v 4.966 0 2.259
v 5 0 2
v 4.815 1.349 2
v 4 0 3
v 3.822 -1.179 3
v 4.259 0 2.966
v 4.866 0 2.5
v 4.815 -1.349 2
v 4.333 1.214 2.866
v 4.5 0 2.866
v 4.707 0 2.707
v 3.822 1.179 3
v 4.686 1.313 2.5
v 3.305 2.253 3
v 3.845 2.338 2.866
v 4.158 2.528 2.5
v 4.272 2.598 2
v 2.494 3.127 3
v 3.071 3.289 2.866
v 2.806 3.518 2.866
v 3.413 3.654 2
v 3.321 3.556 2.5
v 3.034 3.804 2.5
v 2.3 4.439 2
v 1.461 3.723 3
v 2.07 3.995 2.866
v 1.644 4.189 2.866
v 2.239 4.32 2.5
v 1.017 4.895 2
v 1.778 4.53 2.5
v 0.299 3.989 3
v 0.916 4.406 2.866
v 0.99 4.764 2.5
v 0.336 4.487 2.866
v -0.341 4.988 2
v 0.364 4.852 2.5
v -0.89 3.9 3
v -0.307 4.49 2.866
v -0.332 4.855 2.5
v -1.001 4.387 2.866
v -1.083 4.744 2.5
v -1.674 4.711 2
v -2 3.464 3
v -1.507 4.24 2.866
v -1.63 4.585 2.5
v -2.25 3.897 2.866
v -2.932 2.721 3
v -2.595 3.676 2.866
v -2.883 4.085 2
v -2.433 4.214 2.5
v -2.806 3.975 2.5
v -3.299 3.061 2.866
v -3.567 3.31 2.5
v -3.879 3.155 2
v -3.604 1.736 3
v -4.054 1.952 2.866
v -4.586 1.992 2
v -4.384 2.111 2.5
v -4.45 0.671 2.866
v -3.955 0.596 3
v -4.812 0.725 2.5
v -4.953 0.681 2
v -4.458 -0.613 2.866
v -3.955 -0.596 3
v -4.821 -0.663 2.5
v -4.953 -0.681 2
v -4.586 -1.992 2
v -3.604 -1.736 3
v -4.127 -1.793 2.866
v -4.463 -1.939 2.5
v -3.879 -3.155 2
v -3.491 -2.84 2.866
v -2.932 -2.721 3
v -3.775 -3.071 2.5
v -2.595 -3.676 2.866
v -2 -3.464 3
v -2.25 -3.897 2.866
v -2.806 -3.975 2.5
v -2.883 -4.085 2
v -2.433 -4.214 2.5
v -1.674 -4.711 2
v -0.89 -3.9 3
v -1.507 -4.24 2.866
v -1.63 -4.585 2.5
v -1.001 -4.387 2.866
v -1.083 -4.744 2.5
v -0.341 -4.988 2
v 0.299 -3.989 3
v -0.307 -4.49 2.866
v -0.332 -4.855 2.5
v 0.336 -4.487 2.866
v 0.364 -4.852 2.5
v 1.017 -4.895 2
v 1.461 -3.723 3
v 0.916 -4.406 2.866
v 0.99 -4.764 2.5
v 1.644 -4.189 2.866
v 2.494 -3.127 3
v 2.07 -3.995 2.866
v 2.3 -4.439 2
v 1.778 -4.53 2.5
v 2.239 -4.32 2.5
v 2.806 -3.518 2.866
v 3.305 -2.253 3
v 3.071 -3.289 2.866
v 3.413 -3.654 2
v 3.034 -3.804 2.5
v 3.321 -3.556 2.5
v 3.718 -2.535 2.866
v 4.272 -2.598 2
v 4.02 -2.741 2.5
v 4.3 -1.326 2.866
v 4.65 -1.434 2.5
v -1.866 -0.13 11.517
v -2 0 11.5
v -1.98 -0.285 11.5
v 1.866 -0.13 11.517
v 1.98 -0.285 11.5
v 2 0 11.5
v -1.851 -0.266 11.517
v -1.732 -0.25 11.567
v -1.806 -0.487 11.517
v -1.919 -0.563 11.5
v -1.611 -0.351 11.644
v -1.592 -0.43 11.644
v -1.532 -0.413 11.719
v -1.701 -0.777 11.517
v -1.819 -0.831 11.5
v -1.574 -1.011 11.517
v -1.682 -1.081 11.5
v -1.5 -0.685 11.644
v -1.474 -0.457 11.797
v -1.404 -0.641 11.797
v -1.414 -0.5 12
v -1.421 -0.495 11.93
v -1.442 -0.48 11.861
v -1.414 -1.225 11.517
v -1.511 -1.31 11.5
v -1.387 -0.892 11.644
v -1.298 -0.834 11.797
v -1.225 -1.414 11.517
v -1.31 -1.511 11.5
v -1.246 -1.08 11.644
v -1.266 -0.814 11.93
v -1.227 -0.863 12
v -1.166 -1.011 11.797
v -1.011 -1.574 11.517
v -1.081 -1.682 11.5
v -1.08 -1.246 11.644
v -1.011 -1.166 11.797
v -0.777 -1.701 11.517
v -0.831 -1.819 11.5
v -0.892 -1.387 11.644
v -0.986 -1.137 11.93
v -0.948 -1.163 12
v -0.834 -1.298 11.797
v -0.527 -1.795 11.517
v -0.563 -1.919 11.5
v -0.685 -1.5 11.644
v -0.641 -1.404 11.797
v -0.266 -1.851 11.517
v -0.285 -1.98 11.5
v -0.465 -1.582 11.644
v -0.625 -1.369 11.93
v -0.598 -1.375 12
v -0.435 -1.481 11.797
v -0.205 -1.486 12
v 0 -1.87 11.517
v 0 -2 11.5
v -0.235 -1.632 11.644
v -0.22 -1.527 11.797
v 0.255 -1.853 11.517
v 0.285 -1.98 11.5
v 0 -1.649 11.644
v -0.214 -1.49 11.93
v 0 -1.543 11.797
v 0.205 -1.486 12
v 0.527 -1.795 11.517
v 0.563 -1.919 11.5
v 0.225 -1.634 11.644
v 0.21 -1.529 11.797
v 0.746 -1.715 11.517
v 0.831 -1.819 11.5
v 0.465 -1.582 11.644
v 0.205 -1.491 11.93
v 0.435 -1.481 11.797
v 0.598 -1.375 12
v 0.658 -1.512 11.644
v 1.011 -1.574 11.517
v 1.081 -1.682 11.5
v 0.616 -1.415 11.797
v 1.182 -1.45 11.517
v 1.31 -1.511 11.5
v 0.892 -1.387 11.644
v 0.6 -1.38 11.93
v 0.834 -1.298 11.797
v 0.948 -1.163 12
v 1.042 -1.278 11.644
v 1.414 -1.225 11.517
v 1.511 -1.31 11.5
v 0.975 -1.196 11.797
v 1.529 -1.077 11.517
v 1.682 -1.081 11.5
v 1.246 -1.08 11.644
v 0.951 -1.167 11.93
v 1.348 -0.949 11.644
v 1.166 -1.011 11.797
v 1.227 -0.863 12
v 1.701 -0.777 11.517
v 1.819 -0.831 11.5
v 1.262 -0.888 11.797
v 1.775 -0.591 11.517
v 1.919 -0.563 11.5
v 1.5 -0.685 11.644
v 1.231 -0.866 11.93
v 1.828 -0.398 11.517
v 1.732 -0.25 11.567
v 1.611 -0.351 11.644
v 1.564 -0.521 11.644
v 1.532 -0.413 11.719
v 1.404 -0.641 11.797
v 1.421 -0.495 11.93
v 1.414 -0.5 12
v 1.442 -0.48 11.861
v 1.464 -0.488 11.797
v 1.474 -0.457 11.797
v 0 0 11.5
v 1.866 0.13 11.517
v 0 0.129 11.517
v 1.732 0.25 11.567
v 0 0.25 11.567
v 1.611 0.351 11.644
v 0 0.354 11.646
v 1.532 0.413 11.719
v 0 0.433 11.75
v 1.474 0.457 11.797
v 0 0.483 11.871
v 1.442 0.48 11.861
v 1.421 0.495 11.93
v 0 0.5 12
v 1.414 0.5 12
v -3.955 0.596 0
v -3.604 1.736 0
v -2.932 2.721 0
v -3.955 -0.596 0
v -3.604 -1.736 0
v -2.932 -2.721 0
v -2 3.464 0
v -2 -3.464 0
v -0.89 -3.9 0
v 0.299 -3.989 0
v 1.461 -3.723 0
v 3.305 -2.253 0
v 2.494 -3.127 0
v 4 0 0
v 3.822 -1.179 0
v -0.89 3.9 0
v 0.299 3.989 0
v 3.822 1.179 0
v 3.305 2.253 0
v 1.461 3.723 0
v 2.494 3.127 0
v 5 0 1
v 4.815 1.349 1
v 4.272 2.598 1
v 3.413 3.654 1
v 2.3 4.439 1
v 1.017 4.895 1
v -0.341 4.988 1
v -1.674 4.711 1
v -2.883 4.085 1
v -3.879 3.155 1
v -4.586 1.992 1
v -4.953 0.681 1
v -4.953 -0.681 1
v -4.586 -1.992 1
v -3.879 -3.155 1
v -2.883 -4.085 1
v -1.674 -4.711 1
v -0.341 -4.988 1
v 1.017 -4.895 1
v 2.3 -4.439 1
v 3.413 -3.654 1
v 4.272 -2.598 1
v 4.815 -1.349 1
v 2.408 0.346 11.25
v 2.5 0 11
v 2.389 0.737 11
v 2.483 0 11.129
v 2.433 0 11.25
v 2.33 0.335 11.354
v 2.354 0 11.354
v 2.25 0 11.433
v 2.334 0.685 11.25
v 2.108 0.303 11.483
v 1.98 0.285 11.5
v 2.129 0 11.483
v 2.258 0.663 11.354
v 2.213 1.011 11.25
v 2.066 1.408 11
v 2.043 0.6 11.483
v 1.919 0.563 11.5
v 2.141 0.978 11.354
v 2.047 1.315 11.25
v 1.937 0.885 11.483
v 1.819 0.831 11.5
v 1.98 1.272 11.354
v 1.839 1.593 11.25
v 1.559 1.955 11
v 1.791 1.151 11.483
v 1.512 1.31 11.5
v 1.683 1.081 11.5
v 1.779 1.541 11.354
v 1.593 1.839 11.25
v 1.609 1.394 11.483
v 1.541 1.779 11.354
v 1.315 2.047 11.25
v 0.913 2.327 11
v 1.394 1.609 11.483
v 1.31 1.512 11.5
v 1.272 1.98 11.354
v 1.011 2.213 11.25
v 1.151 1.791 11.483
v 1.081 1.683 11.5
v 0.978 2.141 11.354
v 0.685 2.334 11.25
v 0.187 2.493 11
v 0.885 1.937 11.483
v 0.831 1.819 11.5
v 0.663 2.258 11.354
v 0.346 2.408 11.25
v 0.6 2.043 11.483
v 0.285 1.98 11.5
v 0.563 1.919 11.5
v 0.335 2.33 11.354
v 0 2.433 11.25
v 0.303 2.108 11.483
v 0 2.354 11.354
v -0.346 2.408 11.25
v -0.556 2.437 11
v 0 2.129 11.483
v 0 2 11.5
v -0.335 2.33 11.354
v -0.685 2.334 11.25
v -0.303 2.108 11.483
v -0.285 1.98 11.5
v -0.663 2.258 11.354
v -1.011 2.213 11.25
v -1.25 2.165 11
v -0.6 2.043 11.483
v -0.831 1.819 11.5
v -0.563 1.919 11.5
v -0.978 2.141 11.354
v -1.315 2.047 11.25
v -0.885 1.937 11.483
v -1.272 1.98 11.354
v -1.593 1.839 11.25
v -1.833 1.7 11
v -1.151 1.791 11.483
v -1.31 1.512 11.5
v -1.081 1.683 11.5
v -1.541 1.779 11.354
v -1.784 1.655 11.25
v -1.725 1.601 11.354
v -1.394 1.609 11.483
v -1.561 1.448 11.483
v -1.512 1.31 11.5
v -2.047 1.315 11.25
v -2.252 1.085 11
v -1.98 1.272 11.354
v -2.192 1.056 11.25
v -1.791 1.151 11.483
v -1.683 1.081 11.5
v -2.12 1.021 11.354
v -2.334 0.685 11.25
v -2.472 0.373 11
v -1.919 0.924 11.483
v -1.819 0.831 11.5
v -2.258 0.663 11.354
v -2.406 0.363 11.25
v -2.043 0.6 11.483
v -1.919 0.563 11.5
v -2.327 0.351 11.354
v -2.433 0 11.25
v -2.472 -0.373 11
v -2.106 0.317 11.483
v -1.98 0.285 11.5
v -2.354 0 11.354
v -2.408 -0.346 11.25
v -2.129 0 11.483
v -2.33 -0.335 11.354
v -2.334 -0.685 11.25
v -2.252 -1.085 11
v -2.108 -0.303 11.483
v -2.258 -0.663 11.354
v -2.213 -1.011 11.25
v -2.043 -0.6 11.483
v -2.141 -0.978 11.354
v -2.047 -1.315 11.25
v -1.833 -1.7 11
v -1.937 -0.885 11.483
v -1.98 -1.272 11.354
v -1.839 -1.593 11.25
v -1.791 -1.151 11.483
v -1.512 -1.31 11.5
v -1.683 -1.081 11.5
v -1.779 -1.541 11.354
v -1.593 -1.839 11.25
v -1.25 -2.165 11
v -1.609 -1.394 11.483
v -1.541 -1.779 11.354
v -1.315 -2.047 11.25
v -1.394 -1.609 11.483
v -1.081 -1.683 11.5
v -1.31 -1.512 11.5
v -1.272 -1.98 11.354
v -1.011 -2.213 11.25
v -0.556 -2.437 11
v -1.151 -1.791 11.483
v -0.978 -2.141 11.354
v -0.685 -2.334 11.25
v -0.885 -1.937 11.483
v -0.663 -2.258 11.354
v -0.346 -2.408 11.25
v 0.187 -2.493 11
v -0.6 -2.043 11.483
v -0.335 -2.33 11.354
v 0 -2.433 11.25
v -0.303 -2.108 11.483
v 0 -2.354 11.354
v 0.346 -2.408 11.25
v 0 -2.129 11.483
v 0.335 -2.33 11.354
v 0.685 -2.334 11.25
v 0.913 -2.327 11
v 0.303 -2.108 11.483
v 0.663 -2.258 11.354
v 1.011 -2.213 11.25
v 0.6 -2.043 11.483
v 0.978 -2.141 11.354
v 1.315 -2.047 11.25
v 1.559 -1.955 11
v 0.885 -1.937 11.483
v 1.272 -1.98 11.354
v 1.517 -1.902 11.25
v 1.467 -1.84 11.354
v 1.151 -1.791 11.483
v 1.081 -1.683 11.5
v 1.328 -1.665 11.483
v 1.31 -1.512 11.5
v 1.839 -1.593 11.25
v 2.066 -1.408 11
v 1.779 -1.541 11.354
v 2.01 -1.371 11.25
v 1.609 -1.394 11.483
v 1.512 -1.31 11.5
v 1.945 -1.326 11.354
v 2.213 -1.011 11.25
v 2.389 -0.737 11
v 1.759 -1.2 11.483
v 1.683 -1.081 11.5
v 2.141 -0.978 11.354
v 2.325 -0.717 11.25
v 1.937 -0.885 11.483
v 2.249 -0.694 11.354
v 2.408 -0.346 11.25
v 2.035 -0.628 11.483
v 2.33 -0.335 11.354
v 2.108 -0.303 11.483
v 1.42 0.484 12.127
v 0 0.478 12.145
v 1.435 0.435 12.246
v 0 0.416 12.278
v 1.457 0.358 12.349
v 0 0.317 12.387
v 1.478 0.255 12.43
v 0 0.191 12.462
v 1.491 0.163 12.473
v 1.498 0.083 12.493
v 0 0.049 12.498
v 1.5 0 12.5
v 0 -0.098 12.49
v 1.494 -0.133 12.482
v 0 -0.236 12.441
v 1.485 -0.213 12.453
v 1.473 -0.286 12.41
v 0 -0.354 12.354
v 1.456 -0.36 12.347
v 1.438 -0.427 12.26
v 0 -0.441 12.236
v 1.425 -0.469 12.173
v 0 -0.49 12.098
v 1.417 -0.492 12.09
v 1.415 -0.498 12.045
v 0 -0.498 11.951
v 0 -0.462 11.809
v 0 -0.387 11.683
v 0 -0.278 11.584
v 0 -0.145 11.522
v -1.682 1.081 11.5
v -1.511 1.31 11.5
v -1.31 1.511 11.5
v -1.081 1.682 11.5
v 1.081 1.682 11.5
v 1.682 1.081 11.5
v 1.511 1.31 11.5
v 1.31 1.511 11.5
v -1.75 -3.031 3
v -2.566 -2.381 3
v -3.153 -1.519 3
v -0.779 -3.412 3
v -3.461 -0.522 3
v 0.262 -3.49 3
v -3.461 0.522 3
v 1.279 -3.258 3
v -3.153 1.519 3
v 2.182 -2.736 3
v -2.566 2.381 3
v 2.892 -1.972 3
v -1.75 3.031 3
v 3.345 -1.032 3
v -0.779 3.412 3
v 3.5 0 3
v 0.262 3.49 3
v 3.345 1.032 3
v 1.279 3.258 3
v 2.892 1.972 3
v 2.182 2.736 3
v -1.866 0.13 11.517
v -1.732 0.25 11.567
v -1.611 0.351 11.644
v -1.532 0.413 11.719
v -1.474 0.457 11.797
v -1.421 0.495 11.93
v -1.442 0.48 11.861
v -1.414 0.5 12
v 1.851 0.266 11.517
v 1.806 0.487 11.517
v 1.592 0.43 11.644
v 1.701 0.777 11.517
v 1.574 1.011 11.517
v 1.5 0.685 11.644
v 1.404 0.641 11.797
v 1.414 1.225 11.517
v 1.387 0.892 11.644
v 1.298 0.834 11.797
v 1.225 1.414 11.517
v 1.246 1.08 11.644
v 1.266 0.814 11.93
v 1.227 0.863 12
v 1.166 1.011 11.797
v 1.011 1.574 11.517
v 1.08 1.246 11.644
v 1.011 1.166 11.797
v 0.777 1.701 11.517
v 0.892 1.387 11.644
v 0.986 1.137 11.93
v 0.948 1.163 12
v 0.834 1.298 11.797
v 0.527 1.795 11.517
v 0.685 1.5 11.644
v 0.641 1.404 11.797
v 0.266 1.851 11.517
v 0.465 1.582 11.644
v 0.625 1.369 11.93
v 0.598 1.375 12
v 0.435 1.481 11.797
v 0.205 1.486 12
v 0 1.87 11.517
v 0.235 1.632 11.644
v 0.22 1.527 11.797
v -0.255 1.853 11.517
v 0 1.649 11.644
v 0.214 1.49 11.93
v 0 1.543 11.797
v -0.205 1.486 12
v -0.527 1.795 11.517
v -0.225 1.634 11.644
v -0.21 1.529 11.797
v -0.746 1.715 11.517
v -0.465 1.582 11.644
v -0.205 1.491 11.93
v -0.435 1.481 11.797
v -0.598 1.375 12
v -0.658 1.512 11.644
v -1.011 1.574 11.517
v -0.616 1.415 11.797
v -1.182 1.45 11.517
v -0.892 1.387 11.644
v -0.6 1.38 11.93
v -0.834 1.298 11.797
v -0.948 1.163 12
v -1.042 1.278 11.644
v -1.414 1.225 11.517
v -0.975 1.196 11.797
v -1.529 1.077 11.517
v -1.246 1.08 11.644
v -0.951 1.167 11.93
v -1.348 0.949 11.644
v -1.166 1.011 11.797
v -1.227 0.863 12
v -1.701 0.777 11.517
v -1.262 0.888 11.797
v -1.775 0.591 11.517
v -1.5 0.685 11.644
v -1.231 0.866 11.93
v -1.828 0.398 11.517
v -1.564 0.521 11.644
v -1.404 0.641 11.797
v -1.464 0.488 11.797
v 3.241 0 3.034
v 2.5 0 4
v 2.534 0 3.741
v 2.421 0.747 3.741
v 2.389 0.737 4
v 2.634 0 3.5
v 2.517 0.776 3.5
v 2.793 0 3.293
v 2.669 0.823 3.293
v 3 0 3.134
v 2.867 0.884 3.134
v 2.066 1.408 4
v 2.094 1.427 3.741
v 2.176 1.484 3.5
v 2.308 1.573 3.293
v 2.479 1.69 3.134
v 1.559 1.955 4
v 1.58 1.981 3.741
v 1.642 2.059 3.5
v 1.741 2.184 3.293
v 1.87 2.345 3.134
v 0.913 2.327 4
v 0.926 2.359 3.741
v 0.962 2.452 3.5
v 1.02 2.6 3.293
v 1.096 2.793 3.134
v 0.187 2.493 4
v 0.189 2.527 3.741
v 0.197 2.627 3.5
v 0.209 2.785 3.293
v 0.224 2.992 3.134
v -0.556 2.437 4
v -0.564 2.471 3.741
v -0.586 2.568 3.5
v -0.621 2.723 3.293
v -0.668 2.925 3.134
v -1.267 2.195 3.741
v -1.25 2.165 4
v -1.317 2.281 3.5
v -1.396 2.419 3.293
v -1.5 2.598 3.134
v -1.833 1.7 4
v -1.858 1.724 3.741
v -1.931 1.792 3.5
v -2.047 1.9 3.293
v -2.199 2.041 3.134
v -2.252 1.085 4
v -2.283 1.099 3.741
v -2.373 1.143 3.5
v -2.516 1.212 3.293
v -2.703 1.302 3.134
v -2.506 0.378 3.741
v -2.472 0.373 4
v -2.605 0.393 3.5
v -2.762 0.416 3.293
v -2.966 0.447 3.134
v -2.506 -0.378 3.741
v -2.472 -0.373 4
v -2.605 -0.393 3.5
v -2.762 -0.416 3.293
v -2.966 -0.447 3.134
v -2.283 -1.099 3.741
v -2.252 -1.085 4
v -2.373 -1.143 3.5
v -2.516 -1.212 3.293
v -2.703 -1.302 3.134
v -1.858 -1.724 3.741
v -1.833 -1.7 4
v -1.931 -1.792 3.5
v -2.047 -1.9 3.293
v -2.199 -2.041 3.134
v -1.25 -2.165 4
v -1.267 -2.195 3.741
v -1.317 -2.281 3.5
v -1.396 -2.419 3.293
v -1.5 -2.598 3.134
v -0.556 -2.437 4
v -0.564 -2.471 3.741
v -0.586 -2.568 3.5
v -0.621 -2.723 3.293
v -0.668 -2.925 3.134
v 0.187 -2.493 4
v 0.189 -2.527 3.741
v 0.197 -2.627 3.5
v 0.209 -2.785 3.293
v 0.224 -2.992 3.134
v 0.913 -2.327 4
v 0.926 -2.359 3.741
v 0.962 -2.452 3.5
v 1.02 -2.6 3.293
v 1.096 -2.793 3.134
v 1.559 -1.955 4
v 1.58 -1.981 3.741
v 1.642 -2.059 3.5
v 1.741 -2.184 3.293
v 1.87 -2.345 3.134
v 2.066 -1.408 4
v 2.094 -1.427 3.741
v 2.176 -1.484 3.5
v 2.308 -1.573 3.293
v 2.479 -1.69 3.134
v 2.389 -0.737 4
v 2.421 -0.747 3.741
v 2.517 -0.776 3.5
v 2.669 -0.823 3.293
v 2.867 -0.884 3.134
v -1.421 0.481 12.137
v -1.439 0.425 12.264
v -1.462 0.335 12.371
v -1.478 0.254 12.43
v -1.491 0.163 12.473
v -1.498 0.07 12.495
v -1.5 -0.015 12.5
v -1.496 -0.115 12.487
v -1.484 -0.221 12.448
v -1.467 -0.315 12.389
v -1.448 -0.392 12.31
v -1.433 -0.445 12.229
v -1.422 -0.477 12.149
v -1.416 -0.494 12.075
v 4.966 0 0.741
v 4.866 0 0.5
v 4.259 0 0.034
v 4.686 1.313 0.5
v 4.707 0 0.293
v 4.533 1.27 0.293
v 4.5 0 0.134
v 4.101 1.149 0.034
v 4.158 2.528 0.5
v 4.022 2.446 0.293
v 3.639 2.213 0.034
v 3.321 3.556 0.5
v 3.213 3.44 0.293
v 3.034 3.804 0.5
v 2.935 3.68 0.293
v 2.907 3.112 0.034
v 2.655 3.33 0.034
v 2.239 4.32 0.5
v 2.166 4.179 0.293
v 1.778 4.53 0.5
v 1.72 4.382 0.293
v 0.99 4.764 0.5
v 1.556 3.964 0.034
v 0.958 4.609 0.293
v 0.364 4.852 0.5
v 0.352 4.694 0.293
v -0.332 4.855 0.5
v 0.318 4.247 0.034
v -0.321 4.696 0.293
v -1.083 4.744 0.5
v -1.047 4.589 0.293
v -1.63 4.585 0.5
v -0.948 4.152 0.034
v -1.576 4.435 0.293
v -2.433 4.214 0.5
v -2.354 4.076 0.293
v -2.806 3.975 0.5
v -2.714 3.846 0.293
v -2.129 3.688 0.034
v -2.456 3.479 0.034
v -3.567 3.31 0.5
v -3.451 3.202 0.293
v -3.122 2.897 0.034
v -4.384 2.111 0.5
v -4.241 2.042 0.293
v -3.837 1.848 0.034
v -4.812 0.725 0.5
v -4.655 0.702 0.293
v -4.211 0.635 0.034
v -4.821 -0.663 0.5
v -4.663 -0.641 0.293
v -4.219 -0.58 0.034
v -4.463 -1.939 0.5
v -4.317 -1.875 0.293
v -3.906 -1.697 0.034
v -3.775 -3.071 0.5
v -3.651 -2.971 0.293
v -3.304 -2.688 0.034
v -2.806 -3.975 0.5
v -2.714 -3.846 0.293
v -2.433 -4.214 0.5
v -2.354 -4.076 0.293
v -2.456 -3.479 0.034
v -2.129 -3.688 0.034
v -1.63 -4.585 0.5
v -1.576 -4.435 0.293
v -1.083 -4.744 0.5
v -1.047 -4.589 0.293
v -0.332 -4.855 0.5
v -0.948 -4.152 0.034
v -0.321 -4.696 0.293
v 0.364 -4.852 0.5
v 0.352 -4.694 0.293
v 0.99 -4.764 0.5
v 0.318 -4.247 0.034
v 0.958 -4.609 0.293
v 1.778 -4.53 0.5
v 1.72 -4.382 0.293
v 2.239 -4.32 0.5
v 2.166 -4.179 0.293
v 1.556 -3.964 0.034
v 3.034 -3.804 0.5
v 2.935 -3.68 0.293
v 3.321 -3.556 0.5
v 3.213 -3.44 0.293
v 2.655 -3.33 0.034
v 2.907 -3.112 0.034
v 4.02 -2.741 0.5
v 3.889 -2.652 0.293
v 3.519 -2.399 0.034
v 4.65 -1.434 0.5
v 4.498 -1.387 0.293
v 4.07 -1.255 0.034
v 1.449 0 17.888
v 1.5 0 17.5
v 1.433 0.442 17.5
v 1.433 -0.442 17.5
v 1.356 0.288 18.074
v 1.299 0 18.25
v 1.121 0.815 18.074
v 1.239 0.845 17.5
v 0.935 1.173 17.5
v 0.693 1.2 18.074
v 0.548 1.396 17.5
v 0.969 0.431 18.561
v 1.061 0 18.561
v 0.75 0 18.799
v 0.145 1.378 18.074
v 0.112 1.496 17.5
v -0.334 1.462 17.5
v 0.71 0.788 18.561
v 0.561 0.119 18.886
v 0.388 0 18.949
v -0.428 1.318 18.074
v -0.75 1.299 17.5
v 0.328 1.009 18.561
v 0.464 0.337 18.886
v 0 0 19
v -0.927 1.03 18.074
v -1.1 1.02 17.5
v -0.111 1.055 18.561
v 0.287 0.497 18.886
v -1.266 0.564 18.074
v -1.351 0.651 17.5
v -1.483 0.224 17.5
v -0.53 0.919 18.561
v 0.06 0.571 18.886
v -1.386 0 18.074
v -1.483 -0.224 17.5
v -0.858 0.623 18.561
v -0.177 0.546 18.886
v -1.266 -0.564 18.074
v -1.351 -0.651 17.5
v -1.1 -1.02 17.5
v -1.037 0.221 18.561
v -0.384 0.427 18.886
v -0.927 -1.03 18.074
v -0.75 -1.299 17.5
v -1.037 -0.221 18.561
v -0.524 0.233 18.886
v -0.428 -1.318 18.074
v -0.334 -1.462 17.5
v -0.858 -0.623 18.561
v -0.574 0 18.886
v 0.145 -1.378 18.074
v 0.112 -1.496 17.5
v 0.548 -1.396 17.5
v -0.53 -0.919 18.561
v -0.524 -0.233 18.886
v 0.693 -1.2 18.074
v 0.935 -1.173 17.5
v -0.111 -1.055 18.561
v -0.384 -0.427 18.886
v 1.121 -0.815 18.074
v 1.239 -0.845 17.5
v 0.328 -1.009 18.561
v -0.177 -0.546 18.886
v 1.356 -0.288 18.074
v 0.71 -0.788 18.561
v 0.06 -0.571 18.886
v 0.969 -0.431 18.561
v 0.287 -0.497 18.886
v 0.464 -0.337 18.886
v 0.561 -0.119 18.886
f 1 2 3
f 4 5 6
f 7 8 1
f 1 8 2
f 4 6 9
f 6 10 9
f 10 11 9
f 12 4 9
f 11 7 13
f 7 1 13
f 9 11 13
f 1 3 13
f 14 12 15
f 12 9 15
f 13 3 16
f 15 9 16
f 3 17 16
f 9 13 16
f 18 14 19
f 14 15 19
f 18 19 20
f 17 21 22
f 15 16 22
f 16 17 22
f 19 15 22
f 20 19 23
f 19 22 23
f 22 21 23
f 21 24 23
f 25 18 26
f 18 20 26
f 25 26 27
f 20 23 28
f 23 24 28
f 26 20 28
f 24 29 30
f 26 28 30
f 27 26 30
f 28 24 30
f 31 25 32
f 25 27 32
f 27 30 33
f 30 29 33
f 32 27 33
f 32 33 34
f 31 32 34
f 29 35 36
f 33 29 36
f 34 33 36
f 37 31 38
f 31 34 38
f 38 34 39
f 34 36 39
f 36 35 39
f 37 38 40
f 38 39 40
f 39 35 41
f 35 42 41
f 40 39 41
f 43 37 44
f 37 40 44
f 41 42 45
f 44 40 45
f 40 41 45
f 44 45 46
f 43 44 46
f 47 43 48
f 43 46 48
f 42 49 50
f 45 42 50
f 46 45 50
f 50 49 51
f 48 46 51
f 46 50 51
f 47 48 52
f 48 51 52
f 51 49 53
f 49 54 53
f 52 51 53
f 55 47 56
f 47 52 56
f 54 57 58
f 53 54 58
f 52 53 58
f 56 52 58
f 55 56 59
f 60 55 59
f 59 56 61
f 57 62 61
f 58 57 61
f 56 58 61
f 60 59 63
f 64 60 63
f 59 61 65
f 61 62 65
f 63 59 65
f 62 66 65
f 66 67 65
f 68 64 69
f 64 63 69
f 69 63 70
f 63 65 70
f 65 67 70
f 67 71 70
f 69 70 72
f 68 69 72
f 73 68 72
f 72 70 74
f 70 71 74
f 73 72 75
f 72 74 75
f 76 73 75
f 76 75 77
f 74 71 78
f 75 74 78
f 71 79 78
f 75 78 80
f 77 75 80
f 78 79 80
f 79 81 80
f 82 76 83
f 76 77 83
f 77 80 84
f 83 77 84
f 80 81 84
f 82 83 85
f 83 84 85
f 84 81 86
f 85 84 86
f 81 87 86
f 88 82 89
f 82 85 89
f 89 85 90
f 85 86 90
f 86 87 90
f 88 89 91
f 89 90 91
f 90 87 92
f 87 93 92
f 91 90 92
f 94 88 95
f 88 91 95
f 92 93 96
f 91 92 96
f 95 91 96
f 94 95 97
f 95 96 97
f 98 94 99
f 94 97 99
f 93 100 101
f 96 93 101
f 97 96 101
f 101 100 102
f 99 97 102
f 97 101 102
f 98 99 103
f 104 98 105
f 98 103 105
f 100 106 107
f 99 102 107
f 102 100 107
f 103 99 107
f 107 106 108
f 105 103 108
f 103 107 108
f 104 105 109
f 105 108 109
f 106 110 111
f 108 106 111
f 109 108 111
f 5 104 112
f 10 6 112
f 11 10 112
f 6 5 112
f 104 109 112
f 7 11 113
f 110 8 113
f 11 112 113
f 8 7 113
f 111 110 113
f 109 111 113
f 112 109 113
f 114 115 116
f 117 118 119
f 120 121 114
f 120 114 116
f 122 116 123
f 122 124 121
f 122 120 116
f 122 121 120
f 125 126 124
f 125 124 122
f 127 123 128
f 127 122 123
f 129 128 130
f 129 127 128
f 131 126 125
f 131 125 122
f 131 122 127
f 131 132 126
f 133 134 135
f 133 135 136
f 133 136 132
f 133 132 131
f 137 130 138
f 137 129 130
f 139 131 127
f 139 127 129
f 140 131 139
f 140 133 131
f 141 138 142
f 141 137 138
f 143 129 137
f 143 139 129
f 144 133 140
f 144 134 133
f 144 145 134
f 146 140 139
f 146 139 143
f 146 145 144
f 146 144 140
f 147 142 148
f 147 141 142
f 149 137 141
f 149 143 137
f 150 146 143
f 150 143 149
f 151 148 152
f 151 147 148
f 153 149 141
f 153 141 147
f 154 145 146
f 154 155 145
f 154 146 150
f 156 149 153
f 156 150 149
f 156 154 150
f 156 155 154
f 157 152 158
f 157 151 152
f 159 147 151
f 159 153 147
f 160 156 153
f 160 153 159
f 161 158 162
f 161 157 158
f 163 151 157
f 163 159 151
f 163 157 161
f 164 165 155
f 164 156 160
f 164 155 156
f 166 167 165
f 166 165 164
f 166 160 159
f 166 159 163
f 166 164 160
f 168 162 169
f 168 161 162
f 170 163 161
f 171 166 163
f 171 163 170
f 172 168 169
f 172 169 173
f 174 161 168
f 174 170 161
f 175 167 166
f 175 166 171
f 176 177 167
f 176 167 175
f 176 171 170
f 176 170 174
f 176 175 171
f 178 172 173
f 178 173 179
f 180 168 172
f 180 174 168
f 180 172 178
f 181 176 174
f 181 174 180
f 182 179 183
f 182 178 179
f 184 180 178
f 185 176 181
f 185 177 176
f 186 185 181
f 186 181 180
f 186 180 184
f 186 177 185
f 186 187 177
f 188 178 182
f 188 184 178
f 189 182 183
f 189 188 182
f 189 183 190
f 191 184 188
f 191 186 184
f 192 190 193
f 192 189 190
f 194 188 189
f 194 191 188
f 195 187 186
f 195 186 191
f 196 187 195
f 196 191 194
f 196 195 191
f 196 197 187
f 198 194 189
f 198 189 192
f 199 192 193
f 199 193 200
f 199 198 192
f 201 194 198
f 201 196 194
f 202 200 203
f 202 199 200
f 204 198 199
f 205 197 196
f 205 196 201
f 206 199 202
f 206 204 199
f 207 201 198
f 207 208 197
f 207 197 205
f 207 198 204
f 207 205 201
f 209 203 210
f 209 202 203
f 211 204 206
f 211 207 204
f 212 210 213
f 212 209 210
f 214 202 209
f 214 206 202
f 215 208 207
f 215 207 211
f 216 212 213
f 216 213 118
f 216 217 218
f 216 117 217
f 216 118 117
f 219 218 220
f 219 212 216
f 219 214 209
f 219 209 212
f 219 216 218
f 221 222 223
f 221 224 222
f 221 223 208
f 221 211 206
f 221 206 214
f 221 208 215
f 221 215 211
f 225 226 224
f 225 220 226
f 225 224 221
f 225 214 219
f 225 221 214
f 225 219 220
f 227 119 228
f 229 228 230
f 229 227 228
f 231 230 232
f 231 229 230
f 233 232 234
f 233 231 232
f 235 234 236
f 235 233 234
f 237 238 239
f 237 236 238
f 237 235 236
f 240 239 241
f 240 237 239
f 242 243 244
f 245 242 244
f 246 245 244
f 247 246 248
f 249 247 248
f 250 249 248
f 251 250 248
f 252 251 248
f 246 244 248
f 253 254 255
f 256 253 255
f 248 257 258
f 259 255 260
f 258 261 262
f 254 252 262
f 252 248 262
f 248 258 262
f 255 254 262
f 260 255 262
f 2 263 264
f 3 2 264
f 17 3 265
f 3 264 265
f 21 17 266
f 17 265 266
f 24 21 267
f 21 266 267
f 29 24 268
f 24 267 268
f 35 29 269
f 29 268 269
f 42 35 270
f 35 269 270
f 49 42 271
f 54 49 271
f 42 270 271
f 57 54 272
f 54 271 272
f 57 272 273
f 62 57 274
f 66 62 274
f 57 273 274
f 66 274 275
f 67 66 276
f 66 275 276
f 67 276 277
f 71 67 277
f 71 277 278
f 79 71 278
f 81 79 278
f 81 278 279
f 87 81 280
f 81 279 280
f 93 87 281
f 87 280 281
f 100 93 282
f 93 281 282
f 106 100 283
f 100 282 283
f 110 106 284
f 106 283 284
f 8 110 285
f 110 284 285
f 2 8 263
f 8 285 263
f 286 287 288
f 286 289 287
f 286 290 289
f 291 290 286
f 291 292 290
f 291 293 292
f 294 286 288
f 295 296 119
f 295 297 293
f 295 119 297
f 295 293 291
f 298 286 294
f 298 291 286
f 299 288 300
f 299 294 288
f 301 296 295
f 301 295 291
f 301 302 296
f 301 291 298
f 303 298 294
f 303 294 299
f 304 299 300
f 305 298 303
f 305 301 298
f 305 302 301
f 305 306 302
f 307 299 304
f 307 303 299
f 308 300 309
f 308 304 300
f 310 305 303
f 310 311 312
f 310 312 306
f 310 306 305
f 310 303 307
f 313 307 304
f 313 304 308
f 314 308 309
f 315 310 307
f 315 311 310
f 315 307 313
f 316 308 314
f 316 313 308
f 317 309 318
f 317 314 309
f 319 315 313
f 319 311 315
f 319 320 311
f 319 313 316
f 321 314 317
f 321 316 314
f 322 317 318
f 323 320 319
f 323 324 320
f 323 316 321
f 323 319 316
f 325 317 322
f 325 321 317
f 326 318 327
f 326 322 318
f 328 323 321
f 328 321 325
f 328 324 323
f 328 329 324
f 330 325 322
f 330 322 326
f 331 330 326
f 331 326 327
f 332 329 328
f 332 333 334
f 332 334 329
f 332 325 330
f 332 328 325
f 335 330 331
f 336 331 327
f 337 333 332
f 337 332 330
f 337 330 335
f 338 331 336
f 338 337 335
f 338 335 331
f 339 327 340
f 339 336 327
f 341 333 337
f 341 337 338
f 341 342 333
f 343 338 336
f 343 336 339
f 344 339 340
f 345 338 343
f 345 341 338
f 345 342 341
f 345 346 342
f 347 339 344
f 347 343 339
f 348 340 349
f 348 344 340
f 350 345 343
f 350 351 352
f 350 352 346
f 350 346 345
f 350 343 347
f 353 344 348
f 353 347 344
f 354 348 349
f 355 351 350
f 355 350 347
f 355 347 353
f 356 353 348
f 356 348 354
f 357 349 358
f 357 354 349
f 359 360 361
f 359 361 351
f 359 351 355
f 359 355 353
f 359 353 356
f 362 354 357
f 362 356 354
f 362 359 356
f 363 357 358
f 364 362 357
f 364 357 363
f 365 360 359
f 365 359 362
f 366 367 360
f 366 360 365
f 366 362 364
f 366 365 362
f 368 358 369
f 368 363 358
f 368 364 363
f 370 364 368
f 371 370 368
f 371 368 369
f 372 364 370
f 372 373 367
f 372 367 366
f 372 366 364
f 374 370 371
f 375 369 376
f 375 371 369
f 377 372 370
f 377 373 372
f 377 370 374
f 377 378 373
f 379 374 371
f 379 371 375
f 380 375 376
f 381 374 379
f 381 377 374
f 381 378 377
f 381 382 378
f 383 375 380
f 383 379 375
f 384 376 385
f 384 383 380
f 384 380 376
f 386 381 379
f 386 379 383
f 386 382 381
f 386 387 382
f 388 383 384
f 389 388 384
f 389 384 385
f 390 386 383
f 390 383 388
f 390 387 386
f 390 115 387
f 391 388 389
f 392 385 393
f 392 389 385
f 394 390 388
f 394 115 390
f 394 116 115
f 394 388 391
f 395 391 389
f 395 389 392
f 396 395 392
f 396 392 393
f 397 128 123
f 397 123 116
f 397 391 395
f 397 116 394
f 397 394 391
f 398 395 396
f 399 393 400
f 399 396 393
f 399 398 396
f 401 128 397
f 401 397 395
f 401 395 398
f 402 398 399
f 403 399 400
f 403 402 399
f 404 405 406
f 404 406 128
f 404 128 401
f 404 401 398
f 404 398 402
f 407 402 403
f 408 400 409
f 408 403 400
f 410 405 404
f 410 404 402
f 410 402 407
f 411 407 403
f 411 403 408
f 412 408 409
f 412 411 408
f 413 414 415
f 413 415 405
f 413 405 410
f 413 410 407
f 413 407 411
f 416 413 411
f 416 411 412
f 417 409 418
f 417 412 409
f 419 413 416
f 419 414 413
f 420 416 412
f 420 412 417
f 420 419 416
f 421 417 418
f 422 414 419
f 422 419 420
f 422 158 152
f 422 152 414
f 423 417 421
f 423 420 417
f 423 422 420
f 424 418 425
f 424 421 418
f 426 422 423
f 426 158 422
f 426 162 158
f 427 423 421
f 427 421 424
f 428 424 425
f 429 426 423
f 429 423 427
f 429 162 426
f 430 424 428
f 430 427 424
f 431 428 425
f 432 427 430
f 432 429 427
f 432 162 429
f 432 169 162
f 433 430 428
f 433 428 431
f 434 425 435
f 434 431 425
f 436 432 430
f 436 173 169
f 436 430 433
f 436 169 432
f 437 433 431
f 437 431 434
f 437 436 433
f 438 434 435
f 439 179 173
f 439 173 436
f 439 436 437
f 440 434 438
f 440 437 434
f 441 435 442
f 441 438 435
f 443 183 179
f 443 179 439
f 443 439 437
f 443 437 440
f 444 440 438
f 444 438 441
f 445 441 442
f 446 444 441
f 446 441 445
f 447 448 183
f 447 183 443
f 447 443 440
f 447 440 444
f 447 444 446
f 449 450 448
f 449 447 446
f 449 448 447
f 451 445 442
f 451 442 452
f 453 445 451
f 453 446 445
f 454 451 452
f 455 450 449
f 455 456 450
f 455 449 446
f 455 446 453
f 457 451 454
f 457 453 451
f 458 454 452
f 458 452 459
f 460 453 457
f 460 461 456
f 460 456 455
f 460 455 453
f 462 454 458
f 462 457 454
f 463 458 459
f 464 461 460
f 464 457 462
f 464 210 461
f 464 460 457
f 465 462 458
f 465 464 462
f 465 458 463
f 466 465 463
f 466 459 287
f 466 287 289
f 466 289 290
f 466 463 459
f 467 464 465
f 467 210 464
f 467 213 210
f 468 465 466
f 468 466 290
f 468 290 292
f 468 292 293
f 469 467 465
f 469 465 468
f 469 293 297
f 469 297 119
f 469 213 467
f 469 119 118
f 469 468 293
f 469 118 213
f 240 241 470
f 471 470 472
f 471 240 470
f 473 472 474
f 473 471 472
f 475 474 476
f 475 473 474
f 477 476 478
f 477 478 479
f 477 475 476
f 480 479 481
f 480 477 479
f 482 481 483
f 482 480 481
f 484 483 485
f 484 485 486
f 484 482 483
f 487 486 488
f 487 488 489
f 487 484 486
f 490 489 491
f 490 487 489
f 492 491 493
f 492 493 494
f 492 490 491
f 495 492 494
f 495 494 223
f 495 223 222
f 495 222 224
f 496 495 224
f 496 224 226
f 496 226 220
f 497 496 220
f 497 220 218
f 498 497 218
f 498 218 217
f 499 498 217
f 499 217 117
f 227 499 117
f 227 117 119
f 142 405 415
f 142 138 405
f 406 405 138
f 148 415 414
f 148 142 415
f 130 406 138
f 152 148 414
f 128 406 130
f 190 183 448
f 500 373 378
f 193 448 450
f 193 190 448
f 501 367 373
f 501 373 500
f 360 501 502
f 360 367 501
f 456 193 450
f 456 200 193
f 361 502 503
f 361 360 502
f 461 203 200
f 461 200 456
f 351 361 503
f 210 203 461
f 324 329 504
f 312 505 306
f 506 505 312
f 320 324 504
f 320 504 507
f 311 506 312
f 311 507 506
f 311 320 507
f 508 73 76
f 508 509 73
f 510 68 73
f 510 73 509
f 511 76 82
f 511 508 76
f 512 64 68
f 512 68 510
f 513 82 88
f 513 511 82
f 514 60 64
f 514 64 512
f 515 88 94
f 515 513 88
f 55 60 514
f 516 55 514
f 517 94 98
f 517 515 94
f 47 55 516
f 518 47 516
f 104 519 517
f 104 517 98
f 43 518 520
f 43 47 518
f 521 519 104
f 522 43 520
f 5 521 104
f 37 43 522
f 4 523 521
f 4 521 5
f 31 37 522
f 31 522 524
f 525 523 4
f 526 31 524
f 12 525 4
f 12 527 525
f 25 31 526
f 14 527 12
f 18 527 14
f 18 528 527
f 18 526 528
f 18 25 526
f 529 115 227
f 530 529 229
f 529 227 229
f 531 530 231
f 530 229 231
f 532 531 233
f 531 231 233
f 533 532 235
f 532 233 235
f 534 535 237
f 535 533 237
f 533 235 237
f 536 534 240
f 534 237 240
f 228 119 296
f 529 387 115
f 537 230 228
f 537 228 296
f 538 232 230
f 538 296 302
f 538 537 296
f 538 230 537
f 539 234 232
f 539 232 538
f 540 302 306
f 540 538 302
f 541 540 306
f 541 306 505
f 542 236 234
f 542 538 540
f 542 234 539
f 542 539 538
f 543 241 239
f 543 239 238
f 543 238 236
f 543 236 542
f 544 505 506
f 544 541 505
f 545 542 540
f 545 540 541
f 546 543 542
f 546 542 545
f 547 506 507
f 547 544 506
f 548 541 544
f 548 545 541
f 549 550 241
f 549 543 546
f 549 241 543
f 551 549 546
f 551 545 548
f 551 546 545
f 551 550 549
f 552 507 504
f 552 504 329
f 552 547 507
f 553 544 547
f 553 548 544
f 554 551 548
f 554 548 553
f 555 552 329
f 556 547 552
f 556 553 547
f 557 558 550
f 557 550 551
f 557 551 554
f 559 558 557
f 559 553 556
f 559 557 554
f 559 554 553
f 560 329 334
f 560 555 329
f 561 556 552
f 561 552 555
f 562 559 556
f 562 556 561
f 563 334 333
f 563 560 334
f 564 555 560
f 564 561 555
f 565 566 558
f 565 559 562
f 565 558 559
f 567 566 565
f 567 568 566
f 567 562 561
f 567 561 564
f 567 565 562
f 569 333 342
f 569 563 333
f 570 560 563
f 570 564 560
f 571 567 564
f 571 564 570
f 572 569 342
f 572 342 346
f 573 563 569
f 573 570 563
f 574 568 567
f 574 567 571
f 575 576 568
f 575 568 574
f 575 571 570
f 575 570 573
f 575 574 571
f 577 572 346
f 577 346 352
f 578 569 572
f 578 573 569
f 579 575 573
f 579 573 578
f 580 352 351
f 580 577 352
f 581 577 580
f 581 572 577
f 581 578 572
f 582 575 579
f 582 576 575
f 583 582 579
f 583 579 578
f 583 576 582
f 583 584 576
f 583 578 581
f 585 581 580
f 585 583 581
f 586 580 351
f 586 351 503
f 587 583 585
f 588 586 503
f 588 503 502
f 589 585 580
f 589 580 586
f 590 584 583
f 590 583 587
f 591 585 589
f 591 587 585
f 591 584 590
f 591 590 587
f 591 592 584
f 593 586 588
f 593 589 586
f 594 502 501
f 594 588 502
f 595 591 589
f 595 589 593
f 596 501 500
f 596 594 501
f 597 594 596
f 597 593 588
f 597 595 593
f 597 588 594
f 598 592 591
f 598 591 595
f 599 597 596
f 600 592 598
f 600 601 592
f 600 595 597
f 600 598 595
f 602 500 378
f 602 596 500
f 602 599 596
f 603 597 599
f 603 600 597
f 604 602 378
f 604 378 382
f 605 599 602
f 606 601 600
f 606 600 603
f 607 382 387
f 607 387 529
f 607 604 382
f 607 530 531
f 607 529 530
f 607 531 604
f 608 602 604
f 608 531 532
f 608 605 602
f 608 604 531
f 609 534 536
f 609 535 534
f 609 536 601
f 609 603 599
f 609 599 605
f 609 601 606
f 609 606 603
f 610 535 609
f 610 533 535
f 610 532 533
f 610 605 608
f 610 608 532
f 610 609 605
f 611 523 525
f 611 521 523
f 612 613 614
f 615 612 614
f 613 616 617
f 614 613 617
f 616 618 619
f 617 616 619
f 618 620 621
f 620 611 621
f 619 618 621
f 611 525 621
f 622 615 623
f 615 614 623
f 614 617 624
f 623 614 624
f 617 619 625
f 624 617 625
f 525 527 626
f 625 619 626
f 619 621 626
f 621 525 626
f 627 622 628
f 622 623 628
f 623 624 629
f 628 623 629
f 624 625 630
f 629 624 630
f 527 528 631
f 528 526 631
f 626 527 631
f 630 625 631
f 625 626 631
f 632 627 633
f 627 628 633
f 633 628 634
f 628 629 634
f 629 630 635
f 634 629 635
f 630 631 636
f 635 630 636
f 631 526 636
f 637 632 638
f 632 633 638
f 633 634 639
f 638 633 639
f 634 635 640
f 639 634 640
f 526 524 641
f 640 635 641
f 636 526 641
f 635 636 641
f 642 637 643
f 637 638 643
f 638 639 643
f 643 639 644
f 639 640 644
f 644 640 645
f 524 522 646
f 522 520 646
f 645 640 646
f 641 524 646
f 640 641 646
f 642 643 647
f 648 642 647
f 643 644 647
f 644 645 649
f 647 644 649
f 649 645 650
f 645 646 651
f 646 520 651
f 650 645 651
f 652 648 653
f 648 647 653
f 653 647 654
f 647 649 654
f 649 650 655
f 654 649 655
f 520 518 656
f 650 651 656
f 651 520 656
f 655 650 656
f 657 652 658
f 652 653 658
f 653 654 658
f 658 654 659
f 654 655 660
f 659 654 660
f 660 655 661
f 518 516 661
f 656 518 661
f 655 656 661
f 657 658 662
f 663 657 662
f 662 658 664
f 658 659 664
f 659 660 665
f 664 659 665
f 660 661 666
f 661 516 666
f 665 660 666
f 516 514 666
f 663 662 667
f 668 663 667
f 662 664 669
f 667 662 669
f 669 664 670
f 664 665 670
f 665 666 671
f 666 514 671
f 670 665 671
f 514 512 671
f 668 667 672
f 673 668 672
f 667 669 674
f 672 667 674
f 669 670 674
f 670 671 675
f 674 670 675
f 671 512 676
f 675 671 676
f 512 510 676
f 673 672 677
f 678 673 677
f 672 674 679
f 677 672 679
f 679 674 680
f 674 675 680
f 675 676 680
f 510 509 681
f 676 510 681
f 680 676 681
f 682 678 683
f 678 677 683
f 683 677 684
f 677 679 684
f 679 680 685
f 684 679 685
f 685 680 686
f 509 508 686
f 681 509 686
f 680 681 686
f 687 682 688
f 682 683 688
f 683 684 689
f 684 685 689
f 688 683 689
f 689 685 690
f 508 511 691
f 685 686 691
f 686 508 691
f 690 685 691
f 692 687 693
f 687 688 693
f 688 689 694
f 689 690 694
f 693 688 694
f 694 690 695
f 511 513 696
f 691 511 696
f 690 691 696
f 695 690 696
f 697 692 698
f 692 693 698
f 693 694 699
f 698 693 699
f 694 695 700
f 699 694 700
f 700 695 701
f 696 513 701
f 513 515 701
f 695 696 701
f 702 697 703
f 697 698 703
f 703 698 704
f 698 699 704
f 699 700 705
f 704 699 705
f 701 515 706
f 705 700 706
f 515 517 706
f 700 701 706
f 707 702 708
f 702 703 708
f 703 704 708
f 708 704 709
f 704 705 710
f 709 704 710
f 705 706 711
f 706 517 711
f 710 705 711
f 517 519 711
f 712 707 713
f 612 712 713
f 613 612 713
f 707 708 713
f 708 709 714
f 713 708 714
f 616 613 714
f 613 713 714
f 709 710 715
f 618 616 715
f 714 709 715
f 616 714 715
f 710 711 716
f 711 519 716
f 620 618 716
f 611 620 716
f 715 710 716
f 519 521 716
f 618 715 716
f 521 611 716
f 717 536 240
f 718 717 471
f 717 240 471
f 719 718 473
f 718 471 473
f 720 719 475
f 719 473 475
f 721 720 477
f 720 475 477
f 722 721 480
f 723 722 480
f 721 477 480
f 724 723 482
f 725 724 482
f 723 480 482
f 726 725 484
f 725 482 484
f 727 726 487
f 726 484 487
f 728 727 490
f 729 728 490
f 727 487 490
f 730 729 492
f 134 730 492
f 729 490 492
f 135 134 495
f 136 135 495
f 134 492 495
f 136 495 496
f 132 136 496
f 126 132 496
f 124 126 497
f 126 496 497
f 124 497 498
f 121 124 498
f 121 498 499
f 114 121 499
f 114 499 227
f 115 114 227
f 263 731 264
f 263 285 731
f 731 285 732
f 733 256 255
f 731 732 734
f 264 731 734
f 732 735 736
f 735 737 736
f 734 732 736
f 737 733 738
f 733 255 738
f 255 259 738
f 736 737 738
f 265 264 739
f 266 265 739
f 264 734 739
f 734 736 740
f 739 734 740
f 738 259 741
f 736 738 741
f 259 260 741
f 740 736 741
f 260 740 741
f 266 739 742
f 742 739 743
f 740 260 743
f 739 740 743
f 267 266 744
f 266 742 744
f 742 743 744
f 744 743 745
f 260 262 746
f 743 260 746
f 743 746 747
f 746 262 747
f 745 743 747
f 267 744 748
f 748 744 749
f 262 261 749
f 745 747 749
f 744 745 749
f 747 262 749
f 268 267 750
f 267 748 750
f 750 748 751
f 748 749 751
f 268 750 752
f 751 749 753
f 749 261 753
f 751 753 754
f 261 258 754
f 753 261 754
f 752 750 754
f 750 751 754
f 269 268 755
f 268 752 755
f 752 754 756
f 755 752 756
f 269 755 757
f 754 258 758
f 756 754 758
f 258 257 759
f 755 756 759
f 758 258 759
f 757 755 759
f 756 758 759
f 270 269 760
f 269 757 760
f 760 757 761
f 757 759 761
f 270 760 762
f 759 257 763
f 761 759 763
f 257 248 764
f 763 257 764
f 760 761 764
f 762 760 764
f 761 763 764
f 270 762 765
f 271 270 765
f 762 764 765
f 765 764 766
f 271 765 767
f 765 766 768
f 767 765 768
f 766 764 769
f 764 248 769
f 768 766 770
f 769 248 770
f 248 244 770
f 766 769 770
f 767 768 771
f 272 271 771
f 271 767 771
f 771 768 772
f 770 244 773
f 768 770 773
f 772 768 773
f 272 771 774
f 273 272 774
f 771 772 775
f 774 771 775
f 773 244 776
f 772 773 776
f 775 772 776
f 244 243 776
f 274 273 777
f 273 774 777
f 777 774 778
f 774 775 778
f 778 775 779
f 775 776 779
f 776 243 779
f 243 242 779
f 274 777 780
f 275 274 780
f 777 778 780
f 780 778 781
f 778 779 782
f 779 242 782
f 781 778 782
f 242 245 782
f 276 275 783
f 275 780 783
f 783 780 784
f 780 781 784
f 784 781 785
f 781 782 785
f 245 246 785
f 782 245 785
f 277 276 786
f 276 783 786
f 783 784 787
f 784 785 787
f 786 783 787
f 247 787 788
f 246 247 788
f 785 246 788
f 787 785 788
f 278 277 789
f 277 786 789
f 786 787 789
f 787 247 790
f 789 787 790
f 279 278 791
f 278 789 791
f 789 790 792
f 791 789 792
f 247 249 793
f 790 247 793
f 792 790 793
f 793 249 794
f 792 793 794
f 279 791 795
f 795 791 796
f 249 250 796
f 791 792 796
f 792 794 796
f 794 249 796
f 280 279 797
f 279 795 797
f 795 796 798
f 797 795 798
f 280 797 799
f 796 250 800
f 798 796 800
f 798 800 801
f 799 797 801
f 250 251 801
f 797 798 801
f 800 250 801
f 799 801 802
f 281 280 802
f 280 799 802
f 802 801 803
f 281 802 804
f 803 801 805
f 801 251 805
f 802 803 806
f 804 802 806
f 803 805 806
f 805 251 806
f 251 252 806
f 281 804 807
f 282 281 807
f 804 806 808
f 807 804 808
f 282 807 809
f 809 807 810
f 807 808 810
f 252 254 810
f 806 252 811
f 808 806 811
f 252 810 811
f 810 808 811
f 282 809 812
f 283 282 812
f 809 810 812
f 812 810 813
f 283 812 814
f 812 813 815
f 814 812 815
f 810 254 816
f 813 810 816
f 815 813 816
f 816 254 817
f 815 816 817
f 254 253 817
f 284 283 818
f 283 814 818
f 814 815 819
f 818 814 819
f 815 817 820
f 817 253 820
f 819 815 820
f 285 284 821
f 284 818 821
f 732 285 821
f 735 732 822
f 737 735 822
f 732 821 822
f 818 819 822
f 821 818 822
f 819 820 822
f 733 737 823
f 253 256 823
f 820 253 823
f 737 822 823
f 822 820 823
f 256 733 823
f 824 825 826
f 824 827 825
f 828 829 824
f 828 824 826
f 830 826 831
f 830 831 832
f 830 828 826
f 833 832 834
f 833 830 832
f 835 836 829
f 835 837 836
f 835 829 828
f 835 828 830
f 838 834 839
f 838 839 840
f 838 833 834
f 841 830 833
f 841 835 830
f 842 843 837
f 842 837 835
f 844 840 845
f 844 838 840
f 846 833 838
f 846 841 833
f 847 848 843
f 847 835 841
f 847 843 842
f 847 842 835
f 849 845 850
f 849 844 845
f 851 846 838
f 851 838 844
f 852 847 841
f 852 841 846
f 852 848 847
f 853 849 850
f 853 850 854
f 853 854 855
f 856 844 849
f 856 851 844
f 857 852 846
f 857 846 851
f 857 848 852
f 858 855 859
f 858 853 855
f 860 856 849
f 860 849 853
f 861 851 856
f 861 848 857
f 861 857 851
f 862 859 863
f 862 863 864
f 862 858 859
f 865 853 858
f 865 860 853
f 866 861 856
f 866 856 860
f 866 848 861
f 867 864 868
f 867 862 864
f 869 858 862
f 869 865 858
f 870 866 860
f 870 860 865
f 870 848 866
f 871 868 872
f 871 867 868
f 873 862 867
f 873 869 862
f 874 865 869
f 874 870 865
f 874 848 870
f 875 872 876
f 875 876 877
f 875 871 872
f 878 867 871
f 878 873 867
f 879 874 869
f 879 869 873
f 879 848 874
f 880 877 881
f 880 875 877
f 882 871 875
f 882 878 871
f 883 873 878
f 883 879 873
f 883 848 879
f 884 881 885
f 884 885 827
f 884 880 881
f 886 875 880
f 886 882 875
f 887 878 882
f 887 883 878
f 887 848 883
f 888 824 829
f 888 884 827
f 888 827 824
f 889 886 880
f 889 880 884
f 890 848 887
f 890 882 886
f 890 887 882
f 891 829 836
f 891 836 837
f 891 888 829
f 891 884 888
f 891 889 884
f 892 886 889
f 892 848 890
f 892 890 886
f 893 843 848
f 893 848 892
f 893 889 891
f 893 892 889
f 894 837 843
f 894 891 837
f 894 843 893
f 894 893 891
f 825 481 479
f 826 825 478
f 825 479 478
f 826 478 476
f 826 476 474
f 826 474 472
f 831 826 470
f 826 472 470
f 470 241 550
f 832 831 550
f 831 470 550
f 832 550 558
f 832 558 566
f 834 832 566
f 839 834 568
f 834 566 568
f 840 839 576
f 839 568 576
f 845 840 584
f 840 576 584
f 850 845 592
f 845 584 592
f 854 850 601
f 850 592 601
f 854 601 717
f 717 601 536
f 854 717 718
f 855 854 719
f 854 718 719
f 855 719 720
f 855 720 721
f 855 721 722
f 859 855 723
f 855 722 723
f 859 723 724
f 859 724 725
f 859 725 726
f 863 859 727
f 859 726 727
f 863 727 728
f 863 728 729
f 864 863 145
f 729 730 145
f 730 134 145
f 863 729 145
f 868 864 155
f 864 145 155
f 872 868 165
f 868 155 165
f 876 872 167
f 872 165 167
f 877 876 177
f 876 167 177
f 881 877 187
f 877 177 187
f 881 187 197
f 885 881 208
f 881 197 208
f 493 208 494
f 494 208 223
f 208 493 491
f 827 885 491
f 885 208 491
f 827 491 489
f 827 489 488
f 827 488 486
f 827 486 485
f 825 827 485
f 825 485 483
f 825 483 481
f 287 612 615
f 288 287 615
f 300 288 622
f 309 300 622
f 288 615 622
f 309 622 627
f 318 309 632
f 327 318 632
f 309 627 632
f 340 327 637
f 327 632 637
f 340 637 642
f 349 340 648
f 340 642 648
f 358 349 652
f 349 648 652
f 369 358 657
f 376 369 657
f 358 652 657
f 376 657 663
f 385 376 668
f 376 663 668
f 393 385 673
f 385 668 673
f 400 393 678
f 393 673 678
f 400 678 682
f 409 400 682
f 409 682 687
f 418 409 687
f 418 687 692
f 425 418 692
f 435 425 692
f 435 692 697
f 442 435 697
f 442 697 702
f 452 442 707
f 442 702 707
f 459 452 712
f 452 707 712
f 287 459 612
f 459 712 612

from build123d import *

# Parameters (mm, degrees)
F0_R      = 5
F1_DEPTH  = 3
F2_R      = 2.5
F3_DEPTH  = 8.5
F4_R      = 1.5
F5_DEPTH  = 7.5
F6_R      = 1.5
F7_R      = 1
F8_R      = 0.49999
F10_DEPTH = 2.5


# Not quite as in the source:
# - a fillet or chamfer is up to 0.001 mm smaller than in the source, because OpenCascade refuses the exact size


with BuildPart() as f1:
    # F0 (on Top) → F1 (new body)
    with BuildSketch(Plane.XY):
        Circle(F0_R)
    extrude(amount=F1_DEPTH)

    # F2 (on face) → F3 (join)
    with BuildSketch(Plane.XY.offset(3)):
        Circle(F2_R)
    extrude(amount=F3_DEPTH)

    # F4 (on face) → F5 (join)
    with BuildSketch(Plane.XY.offset(11.5)):
        Circle(F4_R)
    extrude(amount=F5_DEPTH)

    # F6
    f6_edges = [f1.edges().sort_by_distance(p)[0] for p in [
        (-1.5, 0, 19),
    ]]
    fillet(f6_edges, radius=F6_R)

    # F7
    f7_edges = [f1.edges().sort_by_distance(p)[0] for p in [
        (-2.5, 0, 3),
        (-5, 0, 0),
        (-5, 0, 3),
    ]]
    fillet(f7_edges, radius=F7_R)

    # F8 (radius 0.5 in the source; OpenCascade refuses exactly that, so slightly less here)
    f8_edges = [f1.edges().sort_by_distance(p)[0] for p in [
        (-1.5, 0, 11.5),
        (-2.5, 0, 11.5),
    ]]
    fillet(f8_edges, radius=F8_R)

    # F9 (on Right) → F10 (cut, symmetric)
    with BuildSketch(Plane.YZ):
        with BuildLine():
            ThreePointArc((0, 11.5), (0.3535533906, 11.6464466094), (0.5, 12))
            ThreePointArc((0.5, 12), (-0.3535533906, 12.3535533906), (0, 11.5))
        make_face()
    extrude(amount=F10_DEPTH, both=True, mode=Mode.SUBTRACT)


solid = f1.part
